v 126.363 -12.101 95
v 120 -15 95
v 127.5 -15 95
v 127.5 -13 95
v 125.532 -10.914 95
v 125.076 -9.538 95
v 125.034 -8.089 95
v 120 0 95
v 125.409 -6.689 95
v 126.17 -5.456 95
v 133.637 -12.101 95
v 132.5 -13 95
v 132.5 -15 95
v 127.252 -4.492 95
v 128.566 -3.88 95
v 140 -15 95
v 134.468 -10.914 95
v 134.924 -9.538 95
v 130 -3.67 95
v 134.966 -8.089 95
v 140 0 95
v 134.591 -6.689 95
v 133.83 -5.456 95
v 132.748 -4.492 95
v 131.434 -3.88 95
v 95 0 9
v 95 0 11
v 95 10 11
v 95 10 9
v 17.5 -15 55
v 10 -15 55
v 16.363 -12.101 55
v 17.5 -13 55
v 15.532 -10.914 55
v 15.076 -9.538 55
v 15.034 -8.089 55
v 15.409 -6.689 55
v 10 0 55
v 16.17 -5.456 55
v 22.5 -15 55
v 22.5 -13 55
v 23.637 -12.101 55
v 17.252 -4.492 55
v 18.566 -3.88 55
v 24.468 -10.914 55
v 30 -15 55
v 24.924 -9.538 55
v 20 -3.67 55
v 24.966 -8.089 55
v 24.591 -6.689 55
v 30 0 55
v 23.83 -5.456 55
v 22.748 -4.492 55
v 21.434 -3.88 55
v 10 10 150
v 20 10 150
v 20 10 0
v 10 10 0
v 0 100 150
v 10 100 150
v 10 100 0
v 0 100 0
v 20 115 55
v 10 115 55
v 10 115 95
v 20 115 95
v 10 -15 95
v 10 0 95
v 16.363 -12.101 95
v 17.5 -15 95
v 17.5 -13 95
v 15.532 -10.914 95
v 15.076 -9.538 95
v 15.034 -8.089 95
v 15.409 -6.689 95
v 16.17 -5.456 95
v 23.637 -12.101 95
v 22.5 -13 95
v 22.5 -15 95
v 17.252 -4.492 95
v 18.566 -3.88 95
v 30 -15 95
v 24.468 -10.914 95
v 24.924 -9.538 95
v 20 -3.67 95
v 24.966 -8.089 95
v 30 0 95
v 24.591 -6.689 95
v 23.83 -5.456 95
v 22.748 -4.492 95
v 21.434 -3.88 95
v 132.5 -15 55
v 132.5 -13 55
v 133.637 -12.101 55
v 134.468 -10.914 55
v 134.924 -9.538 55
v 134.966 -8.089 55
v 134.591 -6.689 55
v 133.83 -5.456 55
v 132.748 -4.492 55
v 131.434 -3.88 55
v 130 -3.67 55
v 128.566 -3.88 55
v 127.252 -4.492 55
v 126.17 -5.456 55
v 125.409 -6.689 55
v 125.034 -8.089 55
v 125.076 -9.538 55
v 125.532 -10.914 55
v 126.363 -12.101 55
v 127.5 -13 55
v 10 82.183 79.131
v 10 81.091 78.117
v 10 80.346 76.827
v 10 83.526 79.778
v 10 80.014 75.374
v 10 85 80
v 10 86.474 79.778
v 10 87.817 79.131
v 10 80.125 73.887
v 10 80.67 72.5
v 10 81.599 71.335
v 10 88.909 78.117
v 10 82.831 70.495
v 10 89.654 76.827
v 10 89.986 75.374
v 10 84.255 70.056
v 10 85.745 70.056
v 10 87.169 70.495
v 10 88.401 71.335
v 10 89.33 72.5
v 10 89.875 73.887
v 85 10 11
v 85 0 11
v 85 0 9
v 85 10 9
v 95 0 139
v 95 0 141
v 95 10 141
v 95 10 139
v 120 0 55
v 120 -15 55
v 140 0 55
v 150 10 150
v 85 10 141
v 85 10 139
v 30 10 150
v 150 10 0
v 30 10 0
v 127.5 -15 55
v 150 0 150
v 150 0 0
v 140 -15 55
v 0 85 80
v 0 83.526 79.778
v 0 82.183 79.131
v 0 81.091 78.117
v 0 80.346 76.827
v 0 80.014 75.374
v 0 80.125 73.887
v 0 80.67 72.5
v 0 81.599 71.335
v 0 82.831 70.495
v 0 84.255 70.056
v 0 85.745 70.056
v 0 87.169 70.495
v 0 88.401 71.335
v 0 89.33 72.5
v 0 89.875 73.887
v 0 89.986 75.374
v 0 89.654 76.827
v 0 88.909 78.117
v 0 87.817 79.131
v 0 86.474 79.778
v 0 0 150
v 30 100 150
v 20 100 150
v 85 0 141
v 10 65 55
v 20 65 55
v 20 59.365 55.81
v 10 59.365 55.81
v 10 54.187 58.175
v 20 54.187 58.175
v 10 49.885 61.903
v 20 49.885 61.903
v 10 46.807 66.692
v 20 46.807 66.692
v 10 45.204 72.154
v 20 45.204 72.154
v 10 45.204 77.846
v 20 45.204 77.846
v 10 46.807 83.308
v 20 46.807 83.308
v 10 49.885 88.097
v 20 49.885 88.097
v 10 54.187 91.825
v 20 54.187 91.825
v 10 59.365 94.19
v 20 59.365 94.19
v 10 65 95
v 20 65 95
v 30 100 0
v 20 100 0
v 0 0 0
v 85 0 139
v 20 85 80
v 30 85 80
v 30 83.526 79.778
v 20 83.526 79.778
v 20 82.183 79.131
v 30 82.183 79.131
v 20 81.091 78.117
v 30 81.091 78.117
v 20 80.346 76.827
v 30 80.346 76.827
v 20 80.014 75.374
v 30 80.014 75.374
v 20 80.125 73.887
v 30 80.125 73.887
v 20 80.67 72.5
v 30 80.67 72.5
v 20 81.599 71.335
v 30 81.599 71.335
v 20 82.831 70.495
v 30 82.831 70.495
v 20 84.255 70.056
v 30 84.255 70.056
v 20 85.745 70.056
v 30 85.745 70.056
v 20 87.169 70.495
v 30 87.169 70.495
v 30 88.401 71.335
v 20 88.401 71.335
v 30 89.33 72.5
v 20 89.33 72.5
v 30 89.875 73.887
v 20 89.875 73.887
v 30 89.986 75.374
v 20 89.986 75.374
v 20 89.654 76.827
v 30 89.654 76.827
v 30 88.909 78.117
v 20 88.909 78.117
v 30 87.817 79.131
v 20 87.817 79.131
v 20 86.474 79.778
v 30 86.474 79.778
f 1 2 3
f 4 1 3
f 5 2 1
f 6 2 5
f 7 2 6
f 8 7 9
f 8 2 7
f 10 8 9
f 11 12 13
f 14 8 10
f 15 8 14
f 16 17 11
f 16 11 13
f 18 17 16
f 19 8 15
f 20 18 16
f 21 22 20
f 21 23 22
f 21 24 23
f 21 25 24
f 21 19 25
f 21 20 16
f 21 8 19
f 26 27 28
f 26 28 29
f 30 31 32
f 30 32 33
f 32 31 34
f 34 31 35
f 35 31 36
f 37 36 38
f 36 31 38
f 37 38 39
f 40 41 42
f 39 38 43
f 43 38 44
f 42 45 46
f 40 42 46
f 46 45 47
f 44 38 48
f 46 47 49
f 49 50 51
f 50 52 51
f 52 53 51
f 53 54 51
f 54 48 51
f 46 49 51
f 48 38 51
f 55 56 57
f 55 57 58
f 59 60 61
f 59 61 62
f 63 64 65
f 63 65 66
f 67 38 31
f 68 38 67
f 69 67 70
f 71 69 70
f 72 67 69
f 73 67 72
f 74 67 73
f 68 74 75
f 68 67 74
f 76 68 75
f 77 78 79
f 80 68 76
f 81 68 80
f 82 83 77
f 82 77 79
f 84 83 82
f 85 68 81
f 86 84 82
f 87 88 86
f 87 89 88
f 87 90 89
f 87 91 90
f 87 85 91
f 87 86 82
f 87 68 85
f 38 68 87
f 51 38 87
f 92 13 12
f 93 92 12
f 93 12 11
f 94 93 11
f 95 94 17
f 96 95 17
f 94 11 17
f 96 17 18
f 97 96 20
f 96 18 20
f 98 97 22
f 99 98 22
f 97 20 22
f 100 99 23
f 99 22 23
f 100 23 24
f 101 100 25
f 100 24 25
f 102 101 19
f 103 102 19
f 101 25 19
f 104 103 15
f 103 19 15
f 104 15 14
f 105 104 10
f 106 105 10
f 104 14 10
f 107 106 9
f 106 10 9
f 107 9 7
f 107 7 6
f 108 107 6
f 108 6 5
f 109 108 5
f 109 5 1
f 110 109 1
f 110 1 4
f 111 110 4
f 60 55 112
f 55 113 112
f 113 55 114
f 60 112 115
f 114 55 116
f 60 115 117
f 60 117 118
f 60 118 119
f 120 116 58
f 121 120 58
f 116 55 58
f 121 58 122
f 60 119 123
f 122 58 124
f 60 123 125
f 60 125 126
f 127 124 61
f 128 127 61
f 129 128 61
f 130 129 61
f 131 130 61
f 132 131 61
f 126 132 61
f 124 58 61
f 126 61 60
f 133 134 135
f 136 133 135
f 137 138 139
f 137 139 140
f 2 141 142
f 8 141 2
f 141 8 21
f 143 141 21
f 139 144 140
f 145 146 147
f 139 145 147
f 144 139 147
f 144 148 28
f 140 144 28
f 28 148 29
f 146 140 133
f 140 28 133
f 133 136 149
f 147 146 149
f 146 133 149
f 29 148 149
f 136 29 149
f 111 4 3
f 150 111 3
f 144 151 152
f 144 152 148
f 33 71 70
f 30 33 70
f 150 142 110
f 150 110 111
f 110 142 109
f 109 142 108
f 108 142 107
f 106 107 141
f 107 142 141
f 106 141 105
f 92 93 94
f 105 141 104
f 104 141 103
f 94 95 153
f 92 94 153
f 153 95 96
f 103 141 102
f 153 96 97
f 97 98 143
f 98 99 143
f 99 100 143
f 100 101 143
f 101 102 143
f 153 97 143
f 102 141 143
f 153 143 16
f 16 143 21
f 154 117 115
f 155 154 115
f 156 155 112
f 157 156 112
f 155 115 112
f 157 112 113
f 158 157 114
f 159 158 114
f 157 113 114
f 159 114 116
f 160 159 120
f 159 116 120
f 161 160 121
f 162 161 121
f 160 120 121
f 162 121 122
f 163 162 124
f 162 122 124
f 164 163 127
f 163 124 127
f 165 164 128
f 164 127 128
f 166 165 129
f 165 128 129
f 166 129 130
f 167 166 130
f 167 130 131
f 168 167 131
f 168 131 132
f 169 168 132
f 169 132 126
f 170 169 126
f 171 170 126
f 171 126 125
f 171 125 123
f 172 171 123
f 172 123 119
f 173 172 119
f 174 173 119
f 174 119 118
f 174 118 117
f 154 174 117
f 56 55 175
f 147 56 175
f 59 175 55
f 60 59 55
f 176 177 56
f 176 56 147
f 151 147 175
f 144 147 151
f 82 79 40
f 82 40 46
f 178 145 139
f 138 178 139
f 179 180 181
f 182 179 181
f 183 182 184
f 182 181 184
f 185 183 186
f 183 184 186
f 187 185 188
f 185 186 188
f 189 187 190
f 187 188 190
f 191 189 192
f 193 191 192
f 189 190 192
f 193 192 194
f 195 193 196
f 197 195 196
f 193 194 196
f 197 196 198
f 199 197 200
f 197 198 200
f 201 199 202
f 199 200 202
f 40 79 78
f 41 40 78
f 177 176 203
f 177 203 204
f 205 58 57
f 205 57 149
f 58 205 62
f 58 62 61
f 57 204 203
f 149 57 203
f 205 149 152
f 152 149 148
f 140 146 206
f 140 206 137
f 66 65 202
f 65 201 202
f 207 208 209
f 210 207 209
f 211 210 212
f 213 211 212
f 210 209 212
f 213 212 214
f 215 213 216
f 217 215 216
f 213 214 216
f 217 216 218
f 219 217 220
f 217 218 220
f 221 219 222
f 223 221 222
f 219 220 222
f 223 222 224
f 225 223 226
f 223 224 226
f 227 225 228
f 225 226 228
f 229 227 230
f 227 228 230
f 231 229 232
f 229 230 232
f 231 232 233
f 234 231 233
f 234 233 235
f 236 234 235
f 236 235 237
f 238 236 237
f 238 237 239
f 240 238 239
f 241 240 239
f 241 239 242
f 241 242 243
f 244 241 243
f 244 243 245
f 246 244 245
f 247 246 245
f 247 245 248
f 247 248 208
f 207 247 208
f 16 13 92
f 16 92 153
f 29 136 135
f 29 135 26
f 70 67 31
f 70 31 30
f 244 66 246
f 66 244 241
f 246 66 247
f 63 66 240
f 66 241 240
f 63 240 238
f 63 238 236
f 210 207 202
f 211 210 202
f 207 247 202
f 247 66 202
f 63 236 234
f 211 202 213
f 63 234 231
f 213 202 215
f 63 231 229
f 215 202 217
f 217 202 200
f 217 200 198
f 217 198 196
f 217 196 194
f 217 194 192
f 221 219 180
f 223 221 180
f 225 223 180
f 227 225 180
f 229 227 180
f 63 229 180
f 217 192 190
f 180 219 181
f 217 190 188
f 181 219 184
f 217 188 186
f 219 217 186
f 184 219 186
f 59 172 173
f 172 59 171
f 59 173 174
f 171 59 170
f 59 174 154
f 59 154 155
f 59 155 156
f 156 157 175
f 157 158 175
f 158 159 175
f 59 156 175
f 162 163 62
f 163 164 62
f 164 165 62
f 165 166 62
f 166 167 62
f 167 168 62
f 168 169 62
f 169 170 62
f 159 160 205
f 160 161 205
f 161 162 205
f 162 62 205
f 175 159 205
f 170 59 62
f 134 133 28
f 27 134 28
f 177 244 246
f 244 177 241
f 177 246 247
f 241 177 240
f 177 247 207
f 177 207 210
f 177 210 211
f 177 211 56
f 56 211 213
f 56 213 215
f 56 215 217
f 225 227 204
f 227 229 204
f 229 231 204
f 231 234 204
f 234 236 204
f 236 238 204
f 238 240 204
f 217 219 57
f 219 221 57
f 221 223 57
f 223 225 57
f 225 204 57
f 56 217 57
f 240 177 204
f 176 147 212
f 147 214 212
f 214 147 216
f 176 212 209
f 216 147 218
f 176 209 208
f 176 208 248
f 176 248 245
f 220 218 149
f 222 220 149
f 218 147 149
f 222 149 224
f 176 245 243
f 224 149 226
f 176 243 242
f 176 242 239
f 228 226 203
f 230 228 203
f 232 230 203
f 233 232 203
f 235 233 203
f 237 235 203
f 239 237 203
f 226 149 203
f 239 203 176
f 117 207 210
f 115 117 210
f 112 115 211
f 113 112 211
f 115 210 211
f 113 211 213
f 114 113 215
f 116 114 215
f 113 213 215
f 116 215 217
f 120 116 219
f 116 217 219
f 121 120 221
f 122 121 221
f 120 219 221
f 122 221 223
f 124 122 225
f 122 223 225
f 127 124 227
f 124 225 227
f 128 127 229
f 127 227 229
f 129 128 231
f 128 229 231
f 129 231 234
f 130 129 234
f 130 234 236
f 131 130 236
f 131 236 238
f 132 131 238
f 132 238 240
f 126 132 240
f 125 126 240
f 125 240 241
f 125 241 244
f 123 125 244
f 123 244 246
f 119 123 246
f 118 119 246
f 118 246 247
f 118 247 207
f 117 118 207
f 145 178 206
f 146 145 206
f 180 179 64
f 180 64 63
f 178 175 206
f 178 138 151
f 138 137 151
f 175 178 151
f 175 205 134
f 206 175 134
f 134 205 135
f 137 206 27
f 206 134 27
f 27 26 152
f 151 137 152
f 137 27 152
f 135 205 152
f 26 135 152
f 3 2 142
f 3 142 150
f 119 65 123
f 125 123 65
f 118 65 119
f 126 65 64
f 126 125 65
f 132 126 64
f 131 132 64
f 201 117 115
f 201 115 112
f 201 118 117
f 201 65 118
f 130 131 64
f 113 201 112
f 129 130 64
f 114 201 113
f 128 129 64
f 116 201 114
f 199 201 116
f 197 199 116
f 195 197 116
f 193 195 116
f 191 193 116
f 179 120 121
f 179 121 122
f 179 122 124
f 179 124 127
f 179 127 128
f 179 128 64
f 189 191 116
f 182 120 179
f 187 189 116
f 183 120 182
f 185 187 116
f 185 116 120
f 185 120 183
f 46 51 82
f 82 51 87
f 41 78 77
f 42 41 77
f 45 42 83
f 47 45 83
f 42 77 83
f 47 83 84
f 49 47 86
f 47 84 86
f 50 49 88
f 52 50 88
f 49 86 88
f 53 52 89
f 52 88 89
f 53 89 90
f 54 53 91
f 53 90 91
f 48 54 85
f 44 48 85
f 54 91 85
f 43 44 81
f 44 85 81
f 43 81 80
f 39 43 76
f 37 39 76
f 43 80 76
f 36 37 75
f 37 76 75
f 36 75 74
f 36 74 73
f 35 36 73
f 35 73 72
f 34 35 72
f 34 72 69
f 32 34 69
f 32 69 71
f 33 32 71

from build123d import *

# Parameters (mm, degrees)
BOSS_EXTRUDE1_DEPTH   = 150
SKETCH3_W             = 10
SKETCH3_H             = 2
CUT_EXTRUDE1_DEPTH    = 10
BOSS_EXTRUDE2_DEPTH   = 10
SKETCH5_R             = 5
CUT_EXTRUDE2_DEPTH    = 217.564078277
SKETCH6_W             = 20
SKETCH6_H             = 40
BOSS_EXTRUDE5_DEPTH   = 15
BOSS_EXTRUDE5_2_DEPTH = 15
CUT_EXTRUDE3_DEPTH    = 204.776838723
CUT_EXTRUDE4_DEPTH    = 204.776838723
SKETCH11_W            = 10
SKETCH11_H            = 40
BOSS_EXTRUDE7_DEPTH   = 15


with BuildPart() as part:
    # Sketch1 → Boss-Extrude1 (new body)
    with BuildSketch(Plane.XY):
        Polygon((20, 100), (20, 10), (10, 10), (10, 100), (0, 100), (0, 10), (0, 0), (10, 0), (150, 0), (150, 10), (30, 10), (30, 100), align=None)
    extrude(amount=BOSS_EXTRUDE1_DEPTH)

    # Sketch3 → Cut-Extrude1 (cut)
    with BuildSketch(Plane(origin=(0, 10, 0), x_dir=(1, 0, 0), z_dir=(0, 1, 0))):
        with Locations((90, -10)):
            Rectangle(SKETCH3_W, SKETCH3_H)
        with Locations((90, -140)):
            Rectangle(SKETCH3_W, SKETCH3_H)
    extrude(amount=-CUT_EXTRUDE1_DEPTH, mode=Mode.SUBTRACT)


with BuildPart() as body_2:
    # Sketch4 → Boss-Extrude2 (new body)
    with BuildSketch(Plane.ZY.offset(-20)):
        with BuildLine():
            Line((95, 100), (55, 100))
            Line((55, 100), (55, 65))
            ThreePointArc((55, 65), (75, 45), (95, 65))
            Line((95, 65), (95, 100))
        make_face()
    extrude(amount=BOSS_EXTRUDE2_DEPTH)


with BuildPart() as cut_extrude2_tool:
    # Sketch5 → Cut-Extrude2 (new, through all)
    with BuildSketch(Plane(origin=(30, 0, 0), x_dir=(0, 0, -1), z_dir=(1, 0, 0))):
        with Locations(Location((-75, 85, 0), (0, 0, 180))):
            Circle(SKETCH5_R)
    extrude(amount=-CUT_EXTRUDE2_DEPTH)


with BuildPart() as part_1:
    add(part.part)

    # Cut-Extrude2: cut by cut_extrude2_tool
    add(cut_extrude2_tool.part, mode=Mode.SUBTRACT)


with BuildPart() as body_2_1:
    add(body_2.part)

    # Cut-Extrude2: cut by cut_extrude2_tool
    add(cut_extrude2_tool.part, mode=Mode.SUBTRACT)

    # Sketch11 → Boss-Extrude7 (add)
    with BuildSketch(Plane(origin=(0, 100, 0), x_dir=(1, 0, 0), z_dir=(0, 1, 0))):
        with Locations((15, -75)):
            Rectangle(SKETCH11_W, SKETCH11_H)
    extrude(amount=BOSS_EXTRUDE7_DEPTH)


with BuildPart() as body_3:
    # Sketch6 → Boss-Extrude5 (new body)
    with BuildSketch(Plane.XZ):
        with Locations((20, 75)):
            Rectangle(SKETCH6_W, SKETCH6_H)
    extrude(amount=BOSS_EXTRUDE5_DEPTH)

    # Sketch7 → Cut-Extrude3 (cut, through all)
    with BuildSketch(Plane.XY.offset(95)):
        with BuildLine():
            Line((22.5, -15), (22.5, -13))
            ThreePointArc((22.5, -13), (20, -3.669872981), (17.5, -13))
            Line((17.5, -13), (17.5, -15))
            Line((17.5, -15), (22.5, -15))
        make_face()
    extrude(amount=-CUT_EXTRUDE3_DEPTH, mode=Mode.SUBTRACT)


with BuildPart() as body_4:
    # Sketch6 → Boss-Extrude5 2 (new body)
    with BuildSketch(Plane.XZ):
        with Locations((130, 75)):
            Rectangle(SKETCH6_W, SKETCH6_H)
    extrude(amount=BOSS_EXTRUDE5_2_DEPTH)

    # Sketch10 → Cut-Extrude4 (cut, through all)
    with BuildSketch(Plane.XY.offset(95)):
        with BuildLine():
            Line((127.5, -15), (132.5, -15))
            Line((132.5, -15), (132.5, -13))
            ThreePointArc((132.5, -13), (130, -3.669872981), (127.5, -13))
            Line((127.5, -13), (127.5, -15))
        make_face()
    extrude(amount=-CUT_EXTRUDE4_DEPTH, mode=Mode.SUBTRACT)


solid = Compound([part_1.part, body_2_1.part, body_3.part, body_4.part])
